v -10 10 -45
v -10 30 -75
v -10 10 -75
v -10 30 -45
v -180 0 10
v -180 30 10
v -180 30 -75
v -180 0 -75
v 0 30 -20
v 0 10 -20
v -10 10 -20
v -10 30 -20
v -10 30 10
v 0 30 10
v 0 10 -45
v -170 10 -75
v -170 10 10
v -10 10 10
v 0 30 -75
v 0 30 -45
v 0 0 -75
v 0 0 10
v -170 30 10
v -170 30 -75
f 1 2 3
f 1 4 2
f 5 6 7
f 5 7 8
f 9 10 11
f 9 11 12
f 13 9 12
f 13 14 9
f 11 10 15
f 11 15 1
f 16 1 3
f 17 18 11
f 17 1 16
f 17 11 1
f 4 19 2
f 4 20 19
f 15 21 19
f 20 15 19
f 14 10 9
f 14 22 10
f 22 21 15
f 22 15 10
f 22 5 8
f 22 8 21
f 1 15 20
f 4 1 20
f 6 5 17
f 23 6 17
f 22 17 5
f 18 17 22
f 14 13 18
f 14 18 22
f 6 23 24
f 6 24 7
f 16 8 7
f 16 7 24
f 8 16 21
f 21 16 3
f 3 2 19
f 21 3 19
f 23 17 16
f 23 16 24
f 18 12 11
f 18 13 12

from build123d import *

# Parameters (mm, degrees)
F1_DEPTH = 10
F2_DEPTH = 85
F3_W     = 20
F3_H     = 25
F4_DEPTH = 88.4


with BuildPart() as f1:
    # F0 (on Top) → F1 (new body)
    with BuildSketch(Plane.XY):
        Polygon((-180, 30), (-180, 0), (0, 0), (0, 30), (-10, 30), (-10, 10), (-170, 10), (-170, 30), align=None)
    extrude(amount=F1_DEPTH)

    # F1_face (on face) → F2 (join)
    with BuildSketch(Plane(origin=(-90, 7.727273, 10), x_dir=(1, 0, 0), z_dir=(0, 0, 1))):
        Polygon((-90, 22.272727), (-90, -7.727273), (90, -7.727273), (90, 22.272727), (80, 22.272727), (80, 2.272727), (-80, 2.272727), (-80, 22.272727), align=None)
    extrude(amount=-F2_DEPTH)

    # F3 (on face) → F4 (cut)
    with BuildSketch(Plane.YZ):
        with Locations((20, -32.5)):
            Rectangle(F3_W, F3_H)
    extrude(amount=-F4_DEPTH, mode=Mode.SUBTRACT)


solid = f1.part
